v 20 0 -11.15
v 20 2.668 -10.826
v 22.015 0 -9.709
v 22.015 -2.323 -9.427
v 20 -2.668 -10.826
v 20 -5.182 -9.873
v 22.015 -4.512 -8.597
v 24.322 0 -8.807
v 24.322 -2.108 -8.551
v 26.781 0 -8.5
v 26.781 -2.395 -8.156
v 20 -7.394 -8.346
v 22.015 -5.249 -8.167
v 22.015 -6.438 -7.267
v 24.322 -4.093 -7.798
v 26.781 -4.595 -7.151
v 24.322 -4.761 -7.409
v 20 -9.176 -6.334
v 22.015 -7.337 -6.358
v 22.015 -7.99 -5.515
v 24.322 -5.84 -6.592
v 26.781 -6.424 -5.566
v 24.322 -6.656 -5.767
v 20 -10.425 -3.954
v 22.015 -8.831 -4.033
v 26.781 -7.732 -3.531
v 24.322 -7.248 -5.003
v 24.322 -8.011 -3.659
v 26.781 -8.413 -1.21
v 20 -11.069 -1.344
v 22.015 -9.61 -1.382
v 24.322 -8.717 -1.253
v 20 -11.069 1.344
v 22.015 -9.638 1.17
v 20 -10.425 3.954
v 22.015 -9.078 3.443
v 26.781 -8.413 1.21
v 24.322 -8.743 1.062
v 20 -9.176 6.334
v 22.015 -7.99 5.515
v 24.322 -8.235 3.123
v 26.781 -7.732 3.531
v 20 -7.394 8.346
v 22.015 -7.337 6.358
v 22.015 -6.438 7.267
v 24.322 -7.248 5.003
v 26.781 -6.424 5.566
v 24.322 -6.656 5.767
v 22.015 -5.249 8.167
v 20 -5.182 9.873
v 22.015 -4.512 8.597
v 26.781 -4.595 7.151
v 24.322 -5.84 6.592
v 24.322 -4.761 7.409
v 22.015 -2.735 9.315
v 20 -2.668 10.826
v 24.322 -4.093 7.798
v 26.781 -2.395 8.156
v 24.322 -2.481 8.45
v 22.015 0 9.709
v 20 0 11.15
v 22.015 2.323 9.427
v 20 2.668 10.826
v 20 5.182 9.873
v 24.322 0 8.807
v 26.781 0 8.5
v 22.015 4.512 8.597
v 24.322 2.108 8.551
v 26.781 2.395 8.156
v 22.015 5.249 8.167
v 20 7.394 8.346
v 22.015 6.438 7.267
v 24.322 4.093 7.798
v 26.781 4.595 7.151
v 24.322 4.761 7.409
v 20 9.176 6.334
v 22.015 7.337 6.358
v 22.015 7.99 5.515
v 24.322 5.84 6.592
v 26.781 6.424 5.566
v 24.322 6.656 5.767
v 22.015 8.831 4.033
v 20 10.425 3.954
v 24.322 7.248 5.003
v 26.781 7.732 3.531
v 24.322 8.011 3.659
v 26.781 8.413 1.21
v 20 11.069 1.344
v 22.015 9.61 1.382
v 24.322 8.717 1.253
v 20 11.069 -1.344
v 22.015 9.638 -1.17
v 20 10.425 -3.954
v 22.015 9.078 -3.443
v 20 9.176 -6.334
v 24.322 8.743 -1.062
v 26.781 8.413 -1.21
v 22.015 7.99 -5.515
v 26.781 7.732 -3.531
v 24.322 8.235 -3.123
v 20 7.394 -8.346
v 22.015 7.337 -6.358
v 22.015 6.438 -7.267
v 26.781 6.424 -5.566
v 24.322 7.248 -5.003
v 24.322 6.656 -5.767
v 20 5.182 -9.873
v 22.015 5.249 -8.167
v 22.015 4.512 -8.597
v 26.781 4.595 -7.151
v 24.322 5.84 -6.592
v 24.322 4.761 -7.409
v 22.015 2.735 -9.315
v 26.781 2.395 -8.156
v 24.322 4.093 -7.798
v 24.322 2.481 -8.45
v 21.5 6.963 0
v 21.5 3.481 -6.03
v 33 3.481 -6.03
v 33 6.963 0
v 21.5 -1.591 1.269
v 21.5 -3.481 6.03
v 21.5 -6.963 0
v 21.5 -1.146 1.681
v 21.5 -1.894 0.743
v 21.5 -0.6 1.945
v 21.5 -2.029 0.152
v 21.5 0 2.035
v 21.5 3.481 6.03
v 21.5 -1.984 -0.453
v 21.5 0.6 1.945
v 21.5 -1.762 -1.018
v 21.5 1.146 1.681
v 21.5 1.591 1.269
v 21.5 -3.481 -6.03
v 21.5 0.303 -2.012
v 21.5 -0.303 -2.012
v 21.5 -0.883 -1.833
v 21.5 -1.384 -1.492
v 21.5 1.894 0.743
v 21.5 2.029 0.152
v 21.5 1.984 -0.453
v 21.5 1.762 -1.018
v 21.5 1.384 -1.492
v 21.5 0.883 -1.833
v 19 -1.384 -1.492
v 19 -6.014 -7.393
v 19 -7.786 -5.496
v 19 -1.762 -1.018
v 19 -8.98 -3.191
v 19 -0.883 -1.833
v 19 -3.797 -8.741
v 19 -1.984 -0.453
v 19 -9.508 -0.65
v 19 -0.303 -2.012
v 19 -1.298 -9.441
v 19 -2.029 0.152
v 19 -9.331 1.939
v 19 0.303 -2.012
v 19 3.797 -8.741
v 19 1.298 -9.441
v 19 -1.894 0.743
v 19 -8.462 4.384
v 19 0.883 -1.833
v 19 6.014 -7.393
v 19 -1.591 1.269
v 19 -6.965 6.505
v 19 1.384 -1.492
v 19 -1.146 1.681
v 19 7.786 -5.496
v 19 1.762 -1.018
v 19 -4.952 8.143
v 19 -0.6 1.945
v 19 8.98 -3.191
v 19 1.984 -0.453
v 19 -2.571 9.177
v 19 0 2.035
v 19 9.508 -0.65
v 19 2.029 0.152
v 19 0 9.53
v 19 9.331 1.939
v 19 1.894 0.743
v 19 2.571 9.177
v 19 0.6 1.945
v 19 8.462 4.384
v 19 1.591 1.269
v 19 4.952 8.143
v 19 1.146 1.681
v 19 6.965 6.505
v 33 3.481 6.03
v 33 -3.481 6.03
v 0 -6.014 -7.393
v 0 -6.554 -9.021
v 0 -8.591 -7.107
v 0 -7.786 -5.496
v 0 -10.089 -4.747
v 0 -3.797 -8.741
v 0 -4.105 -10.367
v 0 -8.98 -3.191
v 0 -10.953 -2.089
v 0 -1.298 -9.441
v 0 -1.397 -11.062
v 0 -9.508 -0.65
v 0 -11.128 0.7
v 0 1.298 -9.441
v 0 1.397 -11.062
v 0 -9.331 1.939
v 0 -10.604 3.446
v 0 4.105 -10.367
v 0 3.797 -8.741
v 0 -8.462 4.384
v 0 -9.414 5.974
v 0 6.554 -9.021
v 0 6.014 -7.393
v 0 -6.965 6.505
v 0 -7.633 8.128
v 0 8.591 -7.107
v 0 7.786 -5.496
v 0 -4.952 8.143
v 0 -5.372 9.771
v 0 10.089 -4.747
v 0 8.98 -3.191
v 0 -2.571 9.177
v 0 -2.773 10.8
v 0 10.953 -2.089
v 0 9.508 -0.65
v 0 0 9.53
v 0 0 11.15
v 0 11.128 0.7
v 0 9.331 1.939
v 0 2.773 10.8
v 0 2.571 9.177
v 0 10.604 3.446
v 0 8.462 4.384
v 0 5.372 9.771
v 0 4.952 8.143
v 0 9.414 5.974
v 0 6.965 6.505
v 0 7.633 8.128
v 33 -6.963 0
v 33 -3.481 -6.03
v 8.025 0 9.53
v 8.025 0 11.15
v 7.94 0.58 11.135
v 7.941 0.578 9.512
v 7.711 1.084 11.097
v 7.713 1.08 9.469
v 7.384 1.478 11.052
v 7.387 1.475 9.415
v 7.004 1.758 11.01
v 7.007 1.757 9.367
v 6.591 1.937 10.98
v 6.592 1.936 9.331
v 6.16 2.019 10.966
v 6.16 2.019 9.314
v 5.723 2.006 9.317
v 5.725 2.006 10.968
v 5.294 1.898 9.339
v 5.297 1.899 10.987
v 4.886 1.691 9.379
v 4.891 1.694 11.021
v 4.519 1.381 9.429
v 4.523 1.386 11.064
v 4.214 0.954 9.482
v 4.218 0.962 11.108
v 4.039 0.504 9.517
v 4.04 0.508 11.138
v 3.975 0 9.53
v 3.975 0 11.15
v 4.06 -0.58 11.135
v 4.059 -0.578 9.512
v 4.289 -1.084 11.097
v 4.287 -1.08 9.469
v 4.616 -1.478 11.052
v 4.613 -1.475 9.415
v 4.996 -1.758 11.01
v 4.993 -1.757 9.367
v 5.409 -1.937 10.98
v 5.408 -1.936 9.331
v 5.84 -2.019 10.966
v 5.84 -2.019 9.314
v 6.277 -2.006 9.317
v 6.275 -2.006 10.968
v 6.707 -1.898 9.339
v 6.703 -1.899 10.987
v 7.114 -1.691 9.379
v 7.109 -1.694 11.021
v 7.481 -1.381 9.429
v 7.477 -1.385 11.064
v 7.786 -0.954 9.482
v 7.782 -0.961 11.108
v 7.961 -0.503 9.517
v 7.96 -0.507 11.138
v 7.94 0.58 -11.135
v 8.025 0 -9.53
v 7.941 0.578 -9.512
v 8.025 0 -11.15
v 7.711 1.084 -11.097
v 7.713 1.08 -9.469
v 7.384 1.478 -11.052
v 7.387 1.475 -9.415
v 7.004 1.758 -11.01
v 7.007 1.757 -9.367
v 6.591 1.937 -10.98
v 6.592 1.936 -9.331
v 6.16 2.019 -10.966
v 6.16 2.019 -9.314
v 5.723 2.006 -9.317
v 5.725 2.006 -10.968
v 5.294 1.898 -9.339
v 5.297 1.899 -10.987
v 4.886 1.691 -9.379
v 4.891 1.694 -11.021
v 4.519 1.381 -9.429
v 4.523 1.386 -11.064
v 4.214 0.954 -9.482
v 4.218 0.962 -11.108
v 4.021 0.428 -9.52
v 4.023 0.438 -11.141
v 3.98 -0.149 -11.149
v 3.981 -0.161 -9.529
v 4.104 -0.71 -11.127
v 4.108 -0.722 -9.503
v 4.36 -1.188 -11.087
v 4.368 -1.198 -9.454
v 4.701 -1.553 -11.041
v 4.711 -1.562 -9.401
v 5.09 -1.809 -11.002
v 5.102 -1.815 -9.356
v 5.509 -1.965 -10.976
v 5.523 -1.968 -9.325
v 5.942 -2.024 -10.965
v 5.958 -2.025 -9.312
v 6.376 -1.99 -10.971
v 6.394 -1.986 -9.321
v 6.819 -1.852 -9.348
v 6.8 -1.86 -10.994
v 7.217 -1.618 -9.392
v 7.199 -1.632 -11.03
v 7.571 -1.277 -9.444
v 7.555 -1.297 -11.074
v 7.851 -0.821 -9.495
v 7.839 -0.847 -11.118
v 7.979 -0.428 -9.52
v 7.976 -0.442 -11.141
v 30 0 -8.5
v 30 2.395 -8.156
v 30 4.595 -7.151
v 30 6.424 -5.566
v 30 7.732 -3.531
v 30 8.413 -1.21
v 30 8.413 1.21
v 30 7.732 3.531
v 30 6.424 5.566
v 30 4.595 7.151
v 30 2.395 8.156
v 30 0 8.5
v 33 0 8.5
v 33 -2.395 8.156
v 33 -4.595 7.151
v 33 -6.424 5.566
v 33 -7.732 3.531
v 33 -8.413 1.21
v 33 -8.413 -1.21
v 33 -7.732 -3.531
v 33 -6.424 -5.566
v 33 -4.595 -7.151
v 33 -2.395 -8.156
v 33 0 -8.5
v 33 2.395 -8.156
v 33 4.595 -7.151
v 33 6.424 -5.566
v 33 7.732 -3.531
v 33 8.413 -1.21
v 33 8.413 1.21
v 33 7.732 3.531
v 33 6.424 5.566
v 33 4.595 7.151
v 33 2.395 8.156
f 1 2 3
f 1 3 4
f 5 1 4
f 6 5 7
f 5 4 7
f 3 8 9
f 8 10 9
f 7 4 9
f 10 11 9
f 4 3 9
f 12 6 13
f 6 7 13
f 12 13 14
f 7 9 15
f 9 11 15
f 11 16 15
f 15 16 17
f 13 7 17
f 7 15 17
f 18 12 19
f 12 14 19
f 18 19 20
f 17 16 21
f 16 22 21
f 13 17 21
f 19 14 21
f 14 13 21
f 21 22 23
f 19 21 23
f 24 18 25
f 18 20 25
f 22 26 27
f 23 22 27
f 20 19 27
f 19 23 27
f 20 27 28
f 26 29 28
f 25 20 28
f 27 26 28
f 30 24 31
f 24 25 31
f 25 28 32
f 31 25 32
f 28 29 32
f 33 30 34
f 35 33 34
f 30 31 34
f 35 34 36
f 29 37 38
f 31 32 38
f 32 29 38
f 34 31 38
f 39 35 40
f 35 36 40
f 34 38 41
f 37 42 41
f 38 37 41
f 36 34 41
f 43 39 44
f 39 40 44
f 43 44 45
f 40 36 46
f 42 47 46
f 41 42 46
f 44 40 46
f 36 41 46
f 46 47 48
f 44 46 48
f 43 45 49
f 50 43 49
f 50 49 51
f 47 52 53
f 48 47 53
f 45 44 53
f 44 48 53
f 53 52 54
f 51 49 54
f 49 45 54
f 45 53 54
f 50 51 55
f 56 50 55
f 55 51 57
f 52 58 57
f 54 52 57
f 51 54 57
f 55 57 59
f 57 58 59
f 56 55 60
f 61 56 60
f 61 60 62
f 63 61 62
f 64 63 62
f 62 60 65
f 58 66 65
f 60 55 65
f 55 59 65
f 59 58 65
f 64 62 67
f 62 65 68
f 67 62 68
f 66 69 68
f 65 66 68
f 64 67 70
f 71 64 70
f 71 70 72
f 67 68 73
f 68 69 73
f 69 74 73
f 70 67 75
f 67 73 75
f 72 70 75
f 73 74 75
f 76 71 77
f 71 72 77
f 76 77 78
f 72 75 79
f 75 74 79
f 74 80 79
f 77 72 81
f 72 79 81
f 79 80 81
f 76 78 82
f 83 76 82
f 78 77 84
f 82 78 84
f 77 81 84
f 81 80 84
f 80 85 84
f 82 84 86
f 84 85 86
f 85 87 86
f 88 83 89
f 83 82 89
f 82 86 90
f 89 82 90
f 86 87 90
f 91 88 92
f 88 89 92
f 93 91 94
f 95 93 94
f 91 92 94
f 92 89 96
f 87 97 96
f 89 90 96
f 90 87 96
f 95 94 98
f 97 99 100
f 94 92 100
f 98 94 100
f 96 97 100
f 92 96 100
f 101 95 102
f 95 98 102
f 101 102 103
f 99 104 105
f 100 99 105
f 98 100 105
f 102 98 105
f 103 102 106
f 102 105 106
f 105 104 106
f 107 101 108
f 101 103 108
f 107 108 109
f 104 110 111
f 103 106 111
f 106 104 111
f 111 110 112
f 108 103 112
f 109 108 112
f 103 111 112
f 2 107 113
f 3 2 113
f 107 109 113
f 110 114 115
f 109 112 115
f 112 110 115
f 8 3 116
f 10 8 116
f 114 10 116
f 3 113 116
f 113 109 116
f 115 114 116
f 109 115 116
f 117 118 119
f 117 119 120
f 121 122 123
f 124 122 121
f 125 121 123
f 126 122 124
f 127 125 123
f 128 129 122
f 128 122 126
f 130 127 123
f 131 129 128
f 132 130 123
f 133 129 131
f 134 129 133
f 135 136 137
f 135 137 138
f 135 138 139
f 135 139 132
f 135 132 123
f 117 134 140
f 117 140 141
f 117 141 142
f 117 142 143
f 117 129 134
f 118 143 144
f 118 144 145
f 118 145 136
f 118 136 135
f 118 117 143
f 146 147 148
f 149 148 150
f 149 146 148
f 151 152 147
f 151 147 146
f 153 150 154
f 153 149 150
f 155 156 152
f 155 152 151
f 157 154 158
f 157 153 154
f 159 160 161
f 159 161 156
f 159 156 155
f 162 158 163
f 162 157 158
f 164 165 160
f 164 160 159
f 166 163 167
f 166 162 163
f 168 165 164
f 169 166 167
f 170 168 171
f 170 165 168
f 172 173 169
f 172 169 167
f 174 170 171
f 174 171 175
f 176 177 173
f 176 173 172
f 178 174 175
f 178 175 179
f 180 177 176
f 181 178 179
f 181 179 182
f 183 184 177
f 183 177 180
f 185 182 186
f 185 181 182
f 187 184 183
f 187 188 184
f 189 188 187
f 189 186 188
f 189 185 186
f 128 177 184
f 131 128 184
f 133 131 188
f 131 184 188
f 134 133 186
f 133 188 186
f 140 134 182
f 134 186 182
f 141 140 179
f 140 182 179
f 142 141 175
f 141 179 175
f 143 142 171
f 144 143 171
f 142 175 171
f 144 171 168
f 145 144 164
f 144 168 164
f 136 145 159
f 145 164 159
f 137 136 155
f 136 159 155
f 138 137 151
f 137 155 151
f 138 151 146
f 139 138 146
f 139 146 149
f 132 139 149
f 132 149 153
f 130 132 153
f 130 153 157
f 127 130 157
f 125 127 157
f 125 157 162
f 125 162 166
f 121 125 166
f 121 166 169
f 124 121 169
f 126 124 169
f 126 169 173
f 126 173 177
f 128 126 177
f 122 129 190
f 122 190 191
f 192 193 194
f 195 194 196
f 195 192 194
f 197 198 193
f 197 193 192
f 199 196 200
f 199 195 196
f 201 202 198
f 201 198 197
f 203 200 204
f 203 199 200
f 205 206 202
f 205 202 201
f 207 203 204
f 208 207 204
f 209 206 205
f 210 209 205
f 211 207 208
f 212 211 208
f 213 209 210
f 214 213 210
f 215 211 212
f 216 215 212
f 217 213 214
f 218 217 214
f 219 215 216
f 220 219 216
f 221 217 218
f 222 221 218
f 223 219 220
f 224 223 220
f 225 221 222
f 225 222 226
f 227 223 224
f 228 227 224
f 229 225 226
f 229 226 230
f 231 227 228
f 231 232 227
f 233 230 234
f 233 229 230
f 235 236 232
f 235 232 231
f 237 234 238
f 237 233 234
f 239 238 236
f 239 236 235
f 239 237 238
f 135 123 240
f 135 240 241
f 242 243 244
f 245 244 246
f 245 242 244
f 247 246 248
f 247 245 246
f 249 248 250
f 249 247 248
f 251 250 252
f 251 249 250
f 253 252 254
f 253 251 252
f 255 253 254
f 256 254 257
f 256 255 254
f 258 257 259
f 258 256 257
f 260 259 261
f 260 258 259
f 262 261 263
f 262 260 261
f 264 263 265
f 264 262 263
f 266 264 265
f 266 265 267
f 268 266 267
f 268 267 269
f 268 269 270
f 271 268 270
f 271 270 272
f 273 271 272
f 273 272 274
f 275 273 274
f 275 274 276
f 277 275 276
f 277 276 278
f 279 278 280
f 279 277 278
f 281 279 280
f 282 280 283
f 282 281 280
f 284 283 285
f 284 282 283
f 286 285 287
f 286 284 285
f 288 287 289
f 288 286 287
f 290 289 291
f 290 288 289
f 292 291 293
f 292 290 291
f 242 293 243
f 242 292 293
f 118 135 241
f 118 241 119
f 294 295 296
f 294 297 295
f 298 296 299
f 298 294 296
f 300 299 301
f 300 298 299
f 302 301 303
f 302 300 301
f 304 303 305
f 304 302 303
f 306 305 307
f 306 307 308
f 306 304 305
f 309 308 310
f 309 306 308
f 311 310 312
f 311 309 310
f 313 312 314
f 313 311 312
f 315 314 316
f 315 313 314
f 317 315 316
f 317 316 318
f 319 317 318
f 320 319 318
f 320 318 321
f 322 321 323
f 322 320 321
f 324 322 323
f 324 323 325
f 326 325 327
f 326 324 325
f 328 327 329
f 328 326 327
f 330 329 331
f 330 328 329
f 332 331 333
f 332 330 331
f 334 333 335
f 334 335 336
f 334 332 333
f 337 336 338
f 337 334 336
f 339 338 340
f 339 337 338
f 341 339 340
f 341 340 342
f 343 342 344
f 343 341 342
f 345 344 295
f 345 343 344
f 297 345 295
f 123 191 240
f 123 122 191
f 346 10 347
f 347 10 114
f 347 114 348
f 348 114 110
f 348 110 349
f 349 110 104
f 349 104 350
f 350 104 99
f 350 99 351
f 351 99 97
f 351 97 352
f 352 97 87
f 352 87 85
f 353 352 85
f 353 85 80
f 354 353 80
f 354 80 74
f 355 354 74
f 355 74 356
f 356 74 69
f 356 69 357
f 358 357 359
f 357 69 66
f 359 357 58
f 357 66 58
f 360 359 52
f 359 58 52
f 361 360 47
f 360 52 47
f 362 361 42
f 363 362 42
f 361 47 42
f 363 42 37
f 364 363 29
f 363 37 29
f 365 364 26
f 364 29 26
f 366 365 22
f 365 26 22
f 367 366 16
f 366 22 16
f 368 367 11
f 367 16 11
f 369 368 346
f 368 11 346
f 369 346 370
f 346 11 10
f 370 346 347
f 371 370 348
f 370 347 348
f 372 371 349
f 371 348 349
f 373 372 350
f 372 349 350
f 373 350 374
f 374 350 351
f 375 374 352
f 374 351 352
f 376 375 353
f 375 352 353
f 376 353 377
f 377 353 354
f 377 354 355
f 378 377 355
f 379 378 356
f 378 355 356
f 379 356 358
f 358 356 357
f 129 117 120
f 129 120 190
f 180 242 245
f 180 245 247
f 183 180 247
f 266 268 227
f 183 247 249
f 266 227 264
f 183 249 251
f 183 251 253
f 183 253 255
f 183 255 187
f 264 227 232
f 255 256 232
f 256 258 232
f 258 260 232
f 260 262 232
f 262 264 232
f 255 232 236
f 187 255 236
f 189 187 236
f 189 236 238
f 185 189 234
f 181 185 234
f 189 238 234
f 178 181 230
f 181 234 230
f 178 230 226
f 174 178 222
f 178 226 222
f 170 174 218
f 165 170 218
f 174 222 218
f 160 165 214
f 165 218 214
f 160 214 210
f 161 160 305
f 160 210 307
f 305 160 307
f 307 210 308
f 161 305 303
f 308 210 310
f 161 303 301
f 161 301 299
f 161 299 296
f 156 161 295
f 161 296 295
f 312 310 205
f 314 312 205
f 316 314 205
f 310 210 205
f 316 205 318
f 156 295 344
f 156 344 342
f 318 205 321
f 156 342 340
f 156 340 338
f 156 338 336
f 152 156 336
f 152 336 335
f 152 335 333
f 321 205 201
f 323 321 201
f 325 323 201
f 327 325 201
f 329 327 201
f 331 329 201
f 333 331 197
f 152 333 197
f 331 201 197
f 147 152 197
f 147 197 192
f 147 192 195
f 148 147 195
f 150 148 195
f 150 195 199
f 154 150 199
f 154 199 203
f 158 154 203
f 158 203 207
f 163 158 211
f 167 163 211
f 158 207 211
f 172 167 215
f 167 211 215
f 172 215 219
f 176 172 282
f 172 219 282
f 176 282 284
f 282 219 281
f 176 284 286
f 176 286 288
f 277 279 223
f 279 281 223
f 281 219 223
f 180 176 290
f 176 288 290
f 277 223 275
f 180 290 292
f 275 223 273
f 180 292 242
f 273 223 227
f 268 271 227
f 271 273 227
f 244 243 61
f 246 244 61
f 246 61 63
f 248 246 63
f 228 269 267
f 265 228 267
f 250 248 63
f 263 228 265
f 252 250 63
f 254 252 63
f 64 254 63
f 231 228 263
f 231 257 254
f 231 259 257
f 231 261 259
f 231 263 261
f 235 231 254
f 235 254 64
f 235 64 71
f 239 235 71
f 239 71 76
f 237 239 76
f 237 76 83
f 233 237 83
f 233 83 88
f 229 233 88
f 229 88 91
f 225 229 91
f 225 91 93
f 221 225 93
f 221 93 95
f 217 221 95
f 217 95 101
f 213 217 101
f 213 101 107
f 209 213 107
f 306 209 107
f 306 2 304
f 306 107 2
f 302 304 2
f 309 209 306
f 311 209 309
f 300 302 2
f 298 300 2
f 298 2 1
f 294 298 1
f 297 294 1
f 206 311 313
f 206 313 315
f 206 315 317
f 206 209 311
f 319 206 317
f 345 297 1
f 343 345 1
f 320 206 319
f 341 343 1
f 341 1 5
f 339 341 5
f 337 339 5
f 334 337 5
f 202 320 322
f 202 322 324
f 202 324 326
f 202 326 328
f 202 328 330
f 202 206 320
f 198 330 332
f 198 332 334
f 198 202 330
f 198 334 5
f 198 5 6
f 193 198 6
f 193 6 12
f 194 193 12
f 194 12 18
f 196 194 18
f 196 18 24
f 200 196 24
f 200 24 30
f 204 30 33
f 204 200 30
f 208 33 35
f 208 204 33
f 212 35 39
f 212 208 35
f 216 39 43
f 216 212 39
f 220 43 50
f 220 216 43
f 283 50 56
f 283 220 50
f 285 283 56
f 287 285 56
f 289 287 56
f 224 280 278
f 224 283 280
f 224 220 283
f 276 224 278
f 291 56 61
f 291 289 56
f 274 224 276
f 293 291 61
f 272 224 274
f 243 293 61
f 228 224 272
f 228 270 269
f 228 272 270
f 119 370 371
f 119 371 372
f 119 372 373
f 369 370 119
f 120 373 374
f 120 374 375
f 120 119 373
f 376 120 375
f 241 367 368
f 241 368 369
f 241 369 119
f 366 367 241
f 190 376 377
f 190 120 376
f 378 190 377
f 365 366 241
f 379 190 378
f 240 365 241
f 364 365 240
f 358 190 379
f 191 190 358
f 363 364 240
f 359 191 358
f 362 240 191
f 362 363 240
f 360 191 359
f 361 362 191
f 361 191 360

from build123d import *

# Parameters (mm, degrees)
CROQUIS1_R                 = 8.5
SALIENTE_EXTRUIR1_DEPTH    = 30
CORTAR_EXTRUIR1_DEPTH      = 8.5
CROQUIS9_R                 = 11.15
SALIENTE_EXTRUIR5_DEPTH    = 20
CROQUIS3_R                 = 9.53
CORTAR_EXTRUIR2_DEPTH      = 19
CORTAR_EXTRUIR3_REACH      = 26.691
CROQUIS4_R                 = 2.035
CORTAR_EXTRUIR4_DEPTH      = 34.891665642
CORTAR_EXTRUIR4_DEPTH_BACK = 34.891665642
CROQUIS5_R                 = 2.025
CROQUIS7_R                 = 8.5
SALIENTE_EXTRUIR3_DEPTH    = 3
REDONDEO1_R                = 10


with BuildPart() as part:
    # Croquis1 → Saliente-Extruir1 (new body)
    with BuildSketch(Plane(origin=(0, 0, 0), x_dir=(0, 0, -1), z_dir=(1, 0, 0))):
        Circle(CROQUIS1_R)
    extrude(amount=SALIENTE_EXTRUIR1_DEPTH)

    # Croquis2 → Cortar-Extruir1 (cut)
    with BuildSketch(Plane(origin=(30, 0, 0), x_dir=(0, 0, -1), z_dir=(1, 0, 0))):
        Polygon((0, -6.962844246), (6.03, -3.481422123), (6.03, 3.481422123), (0, 6.962844246), (-6.03, 3.481422123), (-6.03, -3.481422123), align=None)
    extrude(amount=-CORTAR_EXTRUIR1_DEPTH, mode=Mode.SUBTRACT)

    # Croquis9 → Saliente-Extruir5 (add)
    with BuildSketch(Plane.ZY):
        Circle(CROQUIS9_R)
    extrude(amount=-SALIENTE_EXTRUIR5_DEPTH)

    # Croquis3 → Cortar-Extruir2 (cut)
    with BuildSketch(Plane.ZY):
        Circle(CROQUIS3_R)
    extrude(amount=-CORTAR_EXTRUIR2_DEPTH, mode=Mode.SUBTRACT)

    # Croquis4 → Cortar-Extruir3 (cut, up to next)
    with BuildSketch(Plane.ZY.offset(-19), mode=Mode.PRIVATE) as cortar_extruir3_sk1:
        Circle(CROQUIS4_R)
    cortar_extruir3_tool1 = extrude(cortar_extruir3_sk1.sketch, amount=-CORTAR_EXTRUIR3_REACH, mode=Mode.PRIVATE) & part.part
    add(cortar_extruir3_tool1.solids().sort_by_distance((19, 0, 0))[0], mode=Mode.SUBTRACT)

    # Croquis5 → Cortar-Extruir4 (cut, two sides: drawn at the far end of the back side and taken through both)
    with BuildSketch(Plane.XY.offset(-CORTAR_EXTRUIR4_DEPTH_BACK)):
        with Locations((6, 0)):
            Circle(CROQUIS5_R)
    extrude(amount=CORTAR_EXTRUIR4_DEPTH + CORTAR_EXTRUIR4_DEPTH_BACK, mode=Mode.SUBTRACT)

    # Croquis7 → Saliente-Extruir3 (add)
    with BuildSketch(Plane(origin=(30, 0, 0), x_dir=(0, 0, -1), z_dir=(1, 0, 0))):
        with Locations(Location((0, 0, 0), (0, 0, 180))):
            Circle(CROQUIS7_R)
        Polygon((-6.03, -3.481422123), (0, -6.962844246), (6.03, -3.481422123), (6.03, 3.481422123), (0, 6.962844246), (-6.03, 3.481422123), align=None, mode=Mode.SUBTRACT)
    extrude(amount=SALIENTE_EXTRUIR3_DEPTH)

    # Redondeo1
    # the kernel refuses this fillet: 10 mm, written as the material it adds along each edge
    with BuildSketch(Plane(origin=(20, 0, 0), x_dir=(0, 0, -1), z_dir=(0, 1, 0))) as redondeo1_piece_1:
        with BuildLine():
            CenterArc((18.5, -6.780671058), REDONDEO1_R, 137.307216105, 42.692783895)
            Line((11.15, 0), (11.003, 0.135613421))
            ThreePointArc((11.003, 0.135613421), (9.825, 0.2), (8.5, 0.2))
            Line((8.5, 0.2), (8.3, 0))
            Line((8.3, 0), (8.3, -6.780671058))
            Line((8.3, -6.780671058), (8.5, -6.780671058))
        make_face()
    revolve(axis=Axis((20, 0, 0), (-1, 0, 0)))


solid = part.part
